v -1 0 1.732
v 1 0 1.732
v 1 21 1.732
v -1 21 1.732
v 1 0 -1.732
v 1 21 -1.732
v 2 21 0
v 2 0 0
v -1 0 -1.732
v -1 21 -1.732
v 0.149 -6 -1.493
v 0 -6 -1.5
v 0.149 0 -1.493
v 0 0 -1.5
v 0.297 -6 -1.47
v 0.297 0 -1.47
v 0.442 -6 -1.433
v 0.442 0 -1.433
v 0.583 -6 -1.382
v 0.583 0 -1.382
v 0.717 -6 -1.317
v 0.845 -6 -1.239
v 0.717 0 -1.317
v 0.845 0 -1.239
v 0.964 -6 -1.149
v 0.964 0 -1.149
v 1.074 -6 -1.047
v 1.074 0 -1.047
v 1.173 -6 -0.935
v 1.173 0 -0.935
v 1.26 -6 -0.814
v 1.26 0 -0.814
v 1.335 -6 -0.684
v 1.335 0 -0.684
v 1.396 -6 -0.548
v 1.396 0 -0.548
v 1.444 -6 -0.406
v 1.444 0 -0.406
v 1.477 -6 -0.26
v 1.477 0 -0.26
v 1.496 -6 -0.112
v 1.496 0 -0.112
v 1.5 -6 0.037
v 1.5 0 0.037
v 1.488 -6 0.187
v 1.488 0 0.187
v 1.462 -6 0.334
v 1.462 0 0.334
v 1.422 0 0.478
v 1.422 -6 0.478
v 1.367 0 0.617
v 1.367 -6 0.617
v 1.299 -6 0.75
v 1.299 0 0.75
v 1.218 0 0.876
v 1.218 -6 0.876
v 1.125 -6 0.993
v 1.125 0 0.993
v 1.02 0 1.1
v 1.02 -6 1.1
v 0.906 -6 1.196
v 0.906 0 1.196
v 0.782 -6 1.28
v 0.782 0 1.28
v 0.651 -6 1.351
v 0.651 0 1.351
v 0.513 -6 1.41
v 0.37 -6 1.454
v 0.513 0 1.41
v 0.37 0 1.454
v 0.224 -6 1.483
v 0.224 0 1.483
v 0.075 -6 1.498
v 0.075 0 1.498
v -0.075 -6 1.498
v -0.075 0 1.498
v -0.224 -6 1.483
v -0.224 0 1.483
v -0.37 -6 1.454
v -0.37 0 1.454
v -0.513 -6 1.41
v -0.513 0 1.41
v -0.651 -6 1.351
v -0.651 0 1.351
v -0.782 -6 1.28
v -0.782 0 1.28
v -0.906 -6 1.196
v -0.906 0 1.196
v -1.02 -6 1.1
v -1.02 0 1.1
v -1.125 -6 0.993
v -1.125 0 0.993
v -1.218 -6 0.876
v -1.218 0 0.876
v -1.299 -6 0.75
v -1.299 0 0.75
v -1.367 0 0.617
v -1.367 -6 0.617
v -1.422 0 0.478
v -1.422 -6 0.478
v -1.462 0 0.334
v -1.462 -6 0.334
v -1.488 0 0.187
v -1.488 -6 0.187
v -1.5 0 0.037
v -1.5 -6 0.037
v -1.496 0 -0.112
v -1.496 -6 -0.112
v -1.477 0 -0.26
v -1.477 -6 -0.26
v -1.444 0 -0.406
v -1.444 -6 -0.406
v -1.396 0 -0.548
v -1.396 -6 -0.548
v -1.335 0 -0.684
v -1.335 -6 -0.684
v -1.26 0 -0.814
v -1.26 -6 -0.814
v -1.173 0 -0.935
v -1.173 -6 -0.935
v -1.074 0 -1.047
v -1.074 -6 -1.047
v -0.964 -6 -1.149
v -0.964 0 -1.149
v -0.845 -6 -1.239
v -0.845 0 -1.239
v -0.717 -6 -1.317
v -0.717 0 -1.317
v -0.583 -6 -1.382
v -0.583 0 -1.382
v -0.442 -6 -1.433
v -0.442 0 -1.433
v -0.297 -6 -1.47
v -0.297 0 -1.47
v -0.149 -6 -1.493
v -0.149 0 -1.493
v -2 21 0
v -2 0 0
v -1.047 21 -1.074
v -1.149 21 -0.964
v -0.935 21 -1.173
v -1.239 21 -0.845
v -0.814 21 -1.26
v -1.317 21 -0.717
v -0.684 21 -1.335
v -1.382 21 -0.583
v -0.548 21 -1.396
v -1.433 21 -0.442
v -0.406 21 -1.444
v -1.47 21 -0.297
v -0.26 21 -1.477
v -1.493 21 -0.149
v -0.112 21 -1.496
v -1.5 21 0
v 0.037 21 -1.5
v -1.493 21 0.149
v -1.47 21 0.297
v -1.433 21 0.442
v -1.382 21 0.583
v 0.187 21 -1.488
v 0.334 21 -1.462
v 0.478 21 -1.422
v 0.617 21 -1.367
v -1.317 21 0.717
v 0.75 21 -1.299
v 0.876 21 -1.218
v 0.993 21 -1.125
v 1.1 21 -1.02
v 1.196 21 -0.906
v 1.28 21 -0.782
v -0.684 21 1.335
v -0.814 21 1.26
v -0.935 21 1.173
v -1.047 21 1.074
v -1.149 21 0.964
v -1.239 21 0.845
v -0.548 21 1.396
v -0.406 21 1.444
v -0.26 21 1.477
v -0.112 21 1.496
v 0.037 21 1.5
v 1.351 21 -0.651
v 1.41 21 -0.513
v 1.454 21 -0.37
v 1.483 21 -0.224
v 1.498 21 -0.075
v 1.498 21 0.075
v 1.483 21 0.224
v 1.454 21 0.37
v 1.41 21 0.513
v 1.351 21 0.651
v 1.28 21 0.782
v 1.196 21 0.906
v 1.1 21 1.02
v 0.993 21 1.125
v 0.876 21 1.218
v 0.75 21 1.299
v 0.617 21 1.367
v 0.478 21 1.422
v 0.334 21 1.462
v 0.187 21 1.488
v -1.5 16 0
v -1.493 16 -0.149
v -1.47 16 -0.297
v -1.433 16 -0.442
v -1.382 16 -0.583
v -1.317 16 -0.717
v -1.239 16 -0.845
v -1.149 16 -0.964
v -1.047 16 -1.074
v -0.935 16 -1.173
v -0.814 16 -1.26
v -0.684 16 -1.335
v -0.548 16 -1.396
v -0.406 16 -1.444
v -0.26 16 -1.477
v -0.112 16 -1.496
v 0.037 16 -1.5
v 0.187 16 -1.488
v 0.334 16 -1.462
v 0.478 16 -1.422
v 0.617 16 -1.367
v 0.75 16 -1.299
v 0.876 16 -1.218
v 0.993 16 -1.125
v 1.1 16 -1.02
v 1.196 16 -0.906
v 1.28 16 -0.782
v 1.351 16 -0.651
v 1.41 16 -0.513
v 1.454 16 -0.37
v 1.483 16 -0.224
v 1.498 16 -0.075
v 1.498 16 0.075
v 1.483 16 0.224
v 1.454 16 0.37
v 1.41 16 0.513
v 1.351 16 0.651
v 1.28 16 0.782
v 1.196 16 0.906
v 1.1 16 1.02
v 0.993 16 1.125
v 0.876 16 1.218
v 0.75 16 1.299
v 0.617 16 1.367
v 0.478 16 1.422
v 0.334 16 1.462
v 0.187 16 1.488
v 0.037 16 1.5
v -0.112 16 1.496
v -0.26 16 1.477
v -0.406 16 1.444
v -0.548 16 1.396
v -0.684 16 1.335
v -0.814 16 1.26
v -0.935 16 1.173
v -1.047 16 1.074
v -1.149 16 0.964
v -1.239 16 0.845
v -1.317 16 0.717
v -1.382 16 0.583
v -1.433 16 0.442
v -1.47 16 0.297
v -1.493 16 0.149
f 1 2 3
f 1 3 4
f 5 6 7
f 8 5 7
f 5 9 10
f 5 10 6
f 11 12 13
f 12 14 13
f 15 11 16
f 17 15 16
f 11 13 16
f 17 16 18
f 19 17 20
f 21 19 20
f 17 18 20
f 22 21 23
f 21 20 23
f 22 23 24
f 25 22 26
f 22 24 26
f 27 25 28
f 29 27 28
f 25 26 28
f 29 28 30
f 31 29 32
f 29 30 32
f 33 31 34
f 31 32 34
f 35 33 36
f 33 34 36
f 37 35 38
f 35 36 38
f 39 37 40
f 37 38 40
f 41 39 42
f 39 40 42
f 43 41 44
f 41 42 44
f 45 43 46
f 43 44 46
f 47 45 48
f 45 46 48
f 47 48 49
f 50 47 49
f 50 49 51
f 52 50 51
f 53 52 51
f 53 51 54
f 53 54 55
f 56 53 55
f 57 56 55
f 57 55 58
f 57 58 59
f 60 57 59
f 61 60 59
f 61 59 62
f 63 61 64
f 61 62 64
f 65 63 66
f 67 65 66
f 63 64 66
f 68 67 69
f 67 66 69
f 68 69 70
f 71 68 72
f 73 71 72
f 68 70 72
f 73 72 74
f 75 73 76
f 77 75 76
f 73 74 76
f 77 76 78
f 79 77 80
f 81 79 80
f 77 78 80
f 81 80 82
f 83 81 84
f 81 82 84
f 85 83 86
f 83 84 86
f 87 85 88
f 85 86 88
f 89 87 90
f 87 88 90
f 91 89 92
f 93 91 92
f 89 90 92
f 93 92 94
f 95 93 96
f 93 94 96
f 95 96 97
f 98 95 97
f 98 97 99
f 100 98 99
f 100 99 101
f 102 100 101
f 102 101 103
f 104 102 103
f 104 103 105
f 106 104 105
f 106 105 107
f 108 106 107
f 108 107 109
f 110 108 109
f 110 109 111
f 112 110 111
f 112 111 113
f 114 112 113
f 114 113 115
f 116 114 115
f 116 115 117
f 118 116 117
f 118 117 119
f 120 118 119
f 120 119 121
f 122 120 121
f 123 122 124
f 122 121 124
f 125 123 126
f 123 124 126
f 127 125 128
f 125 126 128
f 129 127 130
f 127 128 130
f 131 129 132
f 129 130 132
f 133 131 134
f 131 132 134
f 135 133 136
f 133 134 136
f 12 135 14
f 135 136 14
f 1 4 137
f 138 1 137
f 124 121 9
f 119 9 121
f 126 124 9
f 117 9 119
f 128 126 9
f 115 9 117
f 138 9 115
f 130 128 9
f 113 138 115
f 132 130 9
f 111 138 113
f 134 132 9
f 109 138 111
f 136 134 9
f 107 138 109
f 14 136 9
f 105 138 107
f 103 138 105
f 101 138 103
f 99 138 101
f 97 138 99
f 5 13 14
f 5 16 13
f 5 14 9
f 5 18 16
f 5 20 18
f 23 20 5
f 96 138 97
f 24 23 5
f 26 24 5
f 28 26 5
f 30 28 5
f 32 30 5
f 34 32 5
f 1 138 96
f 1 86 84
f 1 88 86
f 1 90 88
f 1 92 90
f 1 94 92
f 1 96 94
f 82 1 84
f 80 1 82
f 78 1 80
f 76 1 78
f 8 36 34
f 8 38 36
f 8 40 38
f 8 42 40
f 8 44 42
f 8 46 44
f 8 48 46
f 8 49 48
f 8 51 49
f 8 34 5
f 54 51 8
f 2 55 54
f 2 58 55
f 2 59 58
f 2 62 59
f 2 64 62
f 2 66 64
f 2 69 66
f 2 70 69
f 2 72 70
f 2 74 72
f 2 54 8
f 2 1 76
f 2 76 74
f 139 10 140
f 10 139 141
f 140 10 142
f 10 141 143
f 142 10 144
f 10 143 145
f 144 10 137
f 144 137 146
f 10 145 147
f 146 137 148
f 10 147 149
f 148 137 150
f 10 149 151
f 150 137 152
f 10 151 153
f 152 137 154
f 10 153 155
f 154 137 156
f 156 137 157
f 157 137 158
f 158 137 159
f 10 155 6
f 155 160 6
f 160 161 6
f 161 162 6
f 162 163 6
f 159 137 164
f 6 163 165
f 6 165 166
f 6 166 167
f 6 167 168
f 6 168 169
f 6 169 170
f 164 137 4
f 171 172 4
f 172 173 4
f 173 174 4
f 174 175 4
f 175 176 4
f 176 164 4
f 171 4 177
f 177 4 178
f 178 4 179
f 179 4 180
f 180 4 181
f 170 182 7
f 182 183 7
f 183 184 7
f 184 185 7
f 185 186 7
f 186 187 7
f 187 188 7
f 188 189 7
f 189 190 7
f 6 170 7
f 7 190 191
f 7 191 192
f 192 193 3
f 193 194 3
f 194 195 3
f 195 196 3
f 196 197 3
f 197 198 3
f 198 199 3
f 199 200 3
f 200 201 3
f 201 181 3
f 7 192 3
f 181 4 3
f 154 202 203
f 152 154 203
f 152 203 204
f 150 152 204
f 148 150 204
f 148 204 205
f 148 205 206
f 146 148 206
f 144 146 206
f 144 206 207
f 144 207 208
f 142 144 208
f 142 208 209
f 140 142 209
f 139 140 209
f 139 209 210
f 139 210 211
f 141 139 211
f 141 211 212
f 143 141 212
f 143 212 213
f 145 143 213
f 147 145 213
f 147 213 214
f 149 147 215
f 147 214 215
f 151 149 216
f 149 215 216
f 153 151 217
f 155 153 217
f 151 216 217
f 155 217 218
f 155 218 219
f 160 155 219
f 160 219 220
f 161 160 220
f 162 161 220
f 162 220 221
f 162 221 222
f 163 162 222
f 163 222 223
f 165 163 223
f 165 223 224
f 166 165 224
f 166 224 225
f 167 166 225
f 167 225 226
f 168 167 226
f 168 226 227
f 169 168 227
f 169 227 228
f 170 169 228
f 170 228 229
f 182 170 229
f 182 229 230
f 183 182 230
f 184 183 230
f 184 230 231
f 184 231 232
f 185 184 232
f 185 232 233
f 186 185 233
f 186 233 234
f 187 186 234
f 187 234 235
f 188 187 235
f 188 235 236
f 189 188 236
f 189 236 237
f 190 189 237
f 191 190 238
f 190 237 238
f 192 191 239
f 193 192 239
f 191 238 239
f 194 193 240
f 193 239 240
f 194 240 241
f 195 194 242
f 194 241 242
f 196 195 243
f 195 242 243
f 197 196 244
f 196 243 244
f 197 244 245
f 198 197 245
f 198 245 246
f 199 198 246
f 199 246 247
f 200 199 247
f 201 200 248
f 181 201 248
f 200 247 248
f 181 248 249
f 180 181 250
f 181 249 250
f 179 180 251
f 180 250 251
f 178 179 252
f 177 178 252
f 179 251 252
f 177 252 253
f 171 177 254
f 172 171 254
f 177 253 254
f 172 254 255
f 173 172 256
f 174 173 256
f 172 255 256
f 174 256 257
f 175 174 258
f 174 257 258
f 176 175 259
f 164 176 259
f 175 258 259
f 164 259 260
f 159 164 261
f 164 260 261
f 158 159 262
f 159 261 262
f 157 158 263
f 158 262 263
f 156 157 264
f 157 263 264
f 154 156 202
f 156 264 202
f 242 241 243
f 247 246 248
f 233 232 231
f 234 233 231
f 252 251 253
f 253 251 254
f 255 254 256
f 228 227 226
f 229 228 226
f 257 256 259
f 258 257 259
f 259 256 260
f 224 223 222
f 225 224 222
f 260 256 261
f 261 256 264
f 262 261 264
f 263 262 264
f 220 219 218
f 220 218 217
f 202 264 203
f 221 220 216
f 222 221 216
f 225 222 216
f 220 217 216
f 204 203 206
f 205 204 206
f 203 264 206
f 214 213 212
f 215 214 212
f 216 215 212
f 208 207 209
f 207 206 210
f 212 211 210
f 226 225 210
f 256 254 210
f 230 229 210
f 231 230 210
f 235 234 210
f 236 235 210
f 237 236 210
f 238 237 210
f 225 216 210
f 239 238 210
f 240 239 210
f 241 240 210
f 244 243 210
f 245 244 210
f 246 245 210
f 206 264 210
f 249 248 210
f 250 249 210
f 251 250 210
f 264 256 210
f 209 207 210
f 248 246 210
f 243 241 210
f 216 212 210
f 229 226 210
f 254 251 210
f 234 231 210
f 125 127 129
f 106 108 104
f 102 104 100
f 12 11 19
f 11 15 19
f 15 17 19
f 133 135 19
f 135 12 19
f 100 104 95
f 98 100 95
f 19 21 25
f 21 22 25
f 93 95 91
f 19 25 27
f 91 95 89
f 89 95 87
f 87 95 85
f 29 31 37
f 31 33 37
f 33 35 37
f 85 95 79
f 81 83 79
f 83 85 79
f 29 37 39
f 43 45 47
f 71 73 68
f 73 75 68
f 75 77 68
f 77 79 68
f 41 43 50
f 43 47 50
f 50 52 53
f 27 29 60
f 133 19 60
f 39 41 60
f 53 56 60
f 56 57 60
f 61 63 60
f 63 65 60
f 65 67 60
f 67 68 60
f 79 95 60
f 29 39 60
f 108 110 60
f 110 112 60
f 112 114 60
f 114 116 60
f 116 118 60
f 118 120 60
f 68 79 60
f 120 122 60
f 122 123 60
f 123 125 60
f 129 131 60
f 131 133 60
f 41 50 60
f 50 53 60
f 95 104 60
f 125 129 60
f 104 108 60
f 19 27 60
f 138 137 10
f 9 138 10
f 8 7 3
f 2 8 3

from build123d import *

# Parameters (mm, degrees)
EXTRUDE_1_DEPTH           = 21
SKETCH_2_W                = 1.5
SKETCH_2_H                = 6
HOLE_WIZARD_3_0_3_1_D     = 3
HOLE_WIZARD_3_0_3_1_DEPTH = 5


with BuildPart() as part:
    # 草图1 → 凸台-拉伸1 (new body)
    with BuildSketch(Plane.XZ):
        Polygon((-1, 1.732050808), (-2, 0), (-1, -1.732050808), (1, -1.732050808), (2, 0), (1, 1.732050808), align=None)
    extrude(amount=-EXTRUDE_1_DEPTH)

    # 草图2 → 旋转1 (revolve)
    with BuildSketch(Plane.XY, mode=Mode.PRIVATE) as revolve_1_sk:
        with Locations((0.75, -3)):
            Rectangle(SKETCH_2_W, SKETCH_2_H)
    revolve(revolve_1_sk.sketch.rotate(Axis((0, 0, 0), (0, -1, 0)), 270), axis=Axis((0, 0, 0), (0, -1, 0)))

    # Ø3.0 (3) 直径孔1
    with Locations(Plane(origin=(0, 21, 0), x_dir=(1, 0, 0), z_dir=(0, 1, 0))):
        with Locations((0, 0)):
            Hole(HOLE_WIZARD_3_0_3_1_D / 2, depth=HOLE_WIZARD_3_0_3_1_DEPTH)


solid = part.part
